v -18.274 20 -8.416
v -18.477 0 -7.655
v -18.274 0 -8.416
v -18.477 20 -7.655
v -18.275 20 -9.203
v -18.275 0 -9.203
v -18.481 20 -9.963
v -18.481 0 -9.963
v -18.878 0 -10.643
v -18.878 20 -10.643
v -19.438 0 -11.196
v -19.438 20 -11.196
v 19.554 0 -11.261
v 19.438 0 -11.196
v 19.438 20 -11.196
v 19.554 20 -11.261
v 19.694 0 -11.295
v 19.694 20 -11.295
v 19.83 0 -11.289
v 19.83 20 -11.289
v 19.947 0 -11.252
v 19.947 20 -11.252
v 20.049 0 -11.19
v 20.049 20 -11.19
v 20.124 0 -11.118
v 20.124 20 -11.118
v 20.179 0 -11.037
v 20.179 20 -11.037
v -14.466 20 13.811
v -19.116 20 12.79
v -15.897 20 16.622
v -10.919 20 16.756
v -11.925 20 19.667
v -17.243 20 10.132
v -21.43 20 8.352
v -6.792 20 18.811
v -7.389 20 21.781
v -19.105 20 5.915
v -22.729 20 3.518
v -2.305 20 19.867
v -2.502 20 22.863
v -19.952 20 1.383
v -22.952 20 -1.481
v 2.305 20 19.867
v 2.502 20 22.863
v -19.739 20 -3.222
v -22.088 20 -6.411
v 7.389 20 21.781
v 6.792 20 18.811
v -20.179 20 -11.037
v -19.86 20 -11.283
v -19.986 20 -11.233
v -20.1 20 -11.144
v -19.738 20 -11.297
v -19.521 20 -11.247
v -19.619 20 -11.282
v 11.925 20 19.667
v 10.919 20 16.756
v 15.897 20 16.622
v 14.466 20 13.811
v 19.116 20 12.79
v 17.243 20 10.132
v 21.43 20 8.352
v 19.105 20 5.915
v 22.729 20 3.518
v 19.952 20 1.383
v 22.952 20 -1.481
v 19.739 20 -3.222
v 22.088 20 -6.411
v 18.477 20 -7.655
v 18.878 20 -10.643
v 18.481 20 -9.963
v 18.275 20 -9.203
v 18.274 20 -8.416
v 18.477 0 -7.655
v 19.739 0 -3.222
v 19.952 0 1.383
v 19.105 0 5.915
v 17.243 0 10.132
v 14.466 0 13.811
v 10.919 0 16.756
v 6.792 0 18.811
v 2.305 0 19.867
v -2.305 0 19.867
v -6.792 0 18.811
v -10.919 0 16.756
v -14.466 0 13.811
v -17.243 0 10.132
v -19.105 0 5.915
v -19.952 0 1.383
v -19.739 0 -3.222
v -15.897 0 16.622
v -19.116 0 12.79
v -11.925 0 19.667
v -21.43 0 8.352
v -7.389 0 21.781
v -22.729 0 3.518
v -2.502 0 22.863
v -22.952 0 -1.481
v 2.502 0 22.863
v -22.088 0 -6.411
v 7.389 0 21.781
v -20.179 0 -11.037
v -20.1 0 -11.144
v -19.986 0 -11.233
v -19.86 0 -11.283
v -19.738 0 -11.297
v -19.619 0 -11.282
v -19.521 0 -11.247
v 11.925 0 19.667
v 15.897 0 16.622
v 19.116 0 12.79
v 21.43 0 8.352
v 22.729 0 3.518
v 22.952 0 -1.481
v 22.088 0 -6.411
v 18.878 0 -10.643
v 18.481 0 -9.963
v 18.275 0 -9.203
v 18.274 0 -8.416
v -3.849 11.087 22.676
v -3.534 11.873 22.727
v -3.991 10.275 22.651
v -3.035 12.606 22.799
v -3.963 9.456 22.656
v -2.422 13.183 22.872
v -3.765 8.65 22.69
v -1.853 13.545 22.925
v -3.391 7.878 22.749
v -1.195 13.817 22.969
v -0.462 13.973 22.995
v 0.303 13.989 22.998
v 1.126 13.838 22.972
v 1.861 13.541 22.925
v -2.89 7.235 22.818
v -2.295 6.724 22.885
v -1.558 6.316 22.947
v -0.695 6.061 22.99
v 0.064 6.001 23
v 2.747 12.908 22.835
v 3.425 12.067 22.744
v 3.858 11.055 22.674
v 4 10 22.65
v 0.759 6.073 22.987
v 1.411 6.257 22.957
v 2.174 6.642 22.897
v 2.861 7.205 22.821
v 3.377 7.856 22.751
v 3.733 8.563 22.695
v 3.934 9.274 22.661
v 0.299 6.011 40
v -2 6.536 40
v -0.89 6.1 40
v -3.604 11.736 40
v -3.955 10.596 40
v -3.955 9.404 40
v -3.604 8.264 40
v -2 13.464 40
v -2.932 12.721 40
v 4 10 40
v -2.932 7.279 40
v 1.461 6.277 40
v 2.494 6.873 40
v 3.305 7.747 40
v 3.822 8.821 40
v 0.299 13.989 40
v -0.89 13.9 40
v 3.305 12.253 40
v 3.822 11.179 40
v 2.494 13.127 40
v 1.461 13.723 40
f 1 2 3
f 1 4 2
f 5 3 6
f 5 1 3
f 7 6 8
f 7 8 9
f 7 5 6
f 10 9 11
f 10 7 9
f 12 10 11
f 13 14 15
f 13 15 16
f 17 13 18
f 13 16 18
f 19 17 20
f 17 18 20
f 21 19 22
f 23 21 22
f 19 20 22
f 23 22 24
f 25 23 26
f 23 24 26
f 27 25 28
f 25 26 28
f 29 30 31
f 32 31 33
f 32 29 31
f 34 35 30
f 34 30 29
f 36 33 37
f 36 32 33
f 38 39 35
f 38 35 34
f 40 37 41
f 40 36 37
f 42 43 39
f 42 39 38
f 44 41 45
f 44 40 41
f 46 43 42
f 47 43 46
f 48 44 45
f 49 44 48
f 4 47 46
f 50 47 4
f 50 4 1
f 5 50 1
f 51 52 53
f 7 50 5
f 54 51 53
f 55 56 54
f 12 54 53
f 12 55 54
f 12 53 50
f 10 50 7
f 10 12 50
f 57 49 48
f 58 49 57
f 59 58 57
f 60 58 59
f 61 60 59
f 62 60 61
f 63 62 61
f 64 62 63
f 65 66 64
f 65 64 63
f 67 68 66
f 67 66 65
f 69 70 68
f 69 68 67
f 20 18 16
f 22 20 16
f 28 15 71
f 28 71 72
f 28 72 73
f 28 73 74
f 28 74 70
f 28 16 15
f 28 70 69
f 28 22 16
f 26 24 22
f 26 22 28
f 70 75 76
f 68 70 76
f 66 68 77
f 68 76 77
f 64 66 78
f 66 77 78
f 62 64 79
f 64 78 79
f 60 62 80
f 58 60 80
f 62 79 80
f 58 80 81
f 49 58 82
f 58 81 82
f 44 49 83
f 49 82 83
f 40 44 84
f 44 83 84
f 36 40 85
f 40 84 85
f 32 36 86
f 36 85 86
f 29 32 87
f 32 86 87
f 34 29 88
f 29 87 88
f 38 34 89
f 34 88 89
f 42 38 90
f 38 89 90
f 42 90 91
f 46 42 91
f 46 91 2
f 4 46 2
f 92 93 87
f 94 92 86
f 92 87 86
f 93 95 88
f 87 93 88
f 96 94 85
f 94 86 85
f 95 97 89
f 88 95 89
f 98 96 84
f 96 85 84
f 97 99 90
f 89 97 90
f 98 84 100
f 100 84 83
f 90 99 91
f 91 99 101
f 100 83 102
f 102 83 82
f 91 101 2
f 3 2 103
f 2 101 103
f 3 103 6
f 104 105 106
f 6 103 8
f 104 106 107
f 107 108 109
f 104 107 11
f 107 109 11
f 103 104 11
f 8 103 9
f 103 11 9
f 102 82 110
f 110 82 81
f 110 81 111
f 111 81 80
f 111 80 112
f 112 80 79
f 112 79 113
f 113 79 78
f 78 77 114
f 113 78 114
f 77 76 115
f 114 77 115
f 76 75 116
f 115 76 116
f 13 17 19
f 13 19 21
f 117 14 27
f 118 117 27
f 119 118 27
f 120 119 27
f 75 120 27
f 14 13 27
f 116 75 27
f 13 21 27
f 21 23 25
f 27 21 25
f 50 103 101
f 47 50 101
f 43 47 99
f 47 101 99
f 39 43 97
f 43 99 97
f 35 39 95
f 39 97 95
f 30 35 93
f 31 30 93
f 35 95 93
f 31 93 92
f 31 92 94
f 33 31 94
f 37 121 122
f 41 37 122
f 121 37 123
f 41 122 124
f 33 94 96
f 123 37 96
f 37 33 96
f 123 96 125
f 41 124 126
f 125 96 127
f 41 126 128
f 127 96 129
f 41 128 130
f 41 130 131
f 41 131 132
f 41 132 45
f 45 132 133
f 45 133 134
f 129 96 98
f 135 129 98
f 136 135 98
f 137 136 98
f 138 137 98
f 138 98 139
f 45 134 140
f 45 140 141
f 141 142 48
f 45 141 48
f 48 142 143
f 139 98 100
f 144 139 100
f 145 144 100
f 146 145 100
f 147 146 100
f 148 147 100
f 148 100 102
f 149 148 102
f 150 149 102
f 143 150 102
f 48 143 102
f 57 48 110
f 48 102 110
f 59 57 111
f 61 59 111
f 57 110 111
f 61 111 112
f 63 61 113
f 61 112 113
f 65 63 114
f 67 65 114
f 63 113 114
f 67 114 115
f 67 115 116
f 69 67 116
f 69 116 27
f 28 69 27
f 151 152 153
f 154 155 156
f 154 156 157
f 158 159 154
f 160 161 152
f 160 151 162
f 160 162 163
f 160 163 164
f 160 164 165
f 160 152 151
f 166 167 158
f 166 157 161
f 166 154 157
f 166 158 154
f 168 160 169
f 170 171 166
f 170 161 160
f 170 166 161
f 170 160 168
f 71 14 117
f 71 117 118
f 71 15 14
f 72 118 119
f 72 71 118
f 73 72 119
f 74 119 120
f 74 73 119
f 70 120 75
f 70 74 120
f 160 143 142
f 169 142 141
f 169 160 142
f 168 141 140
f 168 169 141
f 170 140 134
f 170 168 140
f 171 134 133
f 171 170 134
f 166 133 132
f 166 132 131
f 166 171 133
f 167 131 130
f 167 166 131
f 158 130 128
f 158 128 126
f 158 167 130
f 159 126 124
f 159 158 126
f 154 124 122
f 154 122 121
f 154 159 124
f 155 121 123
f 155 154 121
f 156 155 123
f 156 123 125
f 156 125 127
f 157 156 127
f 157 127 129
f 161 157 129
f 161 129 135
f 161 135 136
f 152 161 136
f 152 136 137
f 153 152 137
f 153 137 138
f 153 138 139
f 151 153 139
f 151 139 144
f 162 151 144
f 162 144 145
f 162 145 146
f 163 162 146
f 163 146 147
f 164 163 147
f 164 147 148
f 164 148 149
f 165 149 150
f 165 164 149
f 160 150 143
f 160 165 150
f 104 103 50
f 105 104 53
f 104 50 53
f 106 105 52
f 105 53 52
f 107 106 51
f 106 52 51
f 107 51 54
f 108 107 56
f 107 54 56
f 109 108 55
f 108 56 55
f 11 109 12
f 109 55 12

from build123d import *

# Parameters (mm, degrees)
EXTRUIR1_DEPTH      = 20
EXTRUIR2_REACH      = 80.184
EXTRUIR2_END_RADIUS = 23
EXTRUIR2_START      = 40
CROQUIS2_R          = 4
REDONDEO1_R         = 3
REDONDEO2_R         = 0.5


with BuildPart() as part:
    # Croquis1 → Extruir1 (new body)
    with BuildSketch(Plane(origin=(0, 0, 0), x_dir=(1, 0, 0), z_dir=(0, 1, 0))):
        with BuildLine():
            Line((19.918584287, 11.5), (17.320508076, 10))
            ThreePointArc((17.320508076, 10), (0, -20), (-17.320508076, 10))
            Line((-17.320508076, 10), (-19.918584287, 11.5))
            ThreePointArc((-19.918584287, 11.5), (0, -23), (19.918584287, 11.5))
        make_face()
    extrude(amount=EXTRUIR1_DEPTH)

    # Extruir2: up to this cylinder (the profile starts outside it)
    extruir2_end = Plane(origin=(0, 10, 0), z_dir=(0, -1, 0)) * Cylinder(EXTRUIR2_END_RADIUS, 207.368, mode=Mode.PRIVATE)
    # Croquis2 → Extruir2 (add, up to the surface)
    with BuildSketch(Plane.XY.offset(EXTRUIR2_START), mode=Mode.PRIVATE) as extruir2_sk1:
        with Locations((0, 10)):
            Circle(CROQUIS2_R)
    extruir2_tool1 = extrude(extruir2_sk1.sketch, amount=-EXTRUIR2_REACH, mode=Mode.PRIVATE) - extruir2_end
    add(extruir2_tool1.solids().sort_by_distance((0, 10, 40))[0])

    # Redondeo1
    redondeo1_edges = [part.edges().sort_by_distance(p)[0] for p in [
        (17.320508076, 10, -10),
        (-17.320508076, 10, -10),
    ]]
    fillet(redondeo1_edges, radius=REDONDEO1_R)

    # Redondeo2
    redondeo2_edges = [part.edges().sort_by_distance(p)[0] for p in [
        (19.918584287, 10, -11.5),
        (-19.918584287, 10, -11.5),
    ]]
    fillet(redondeo2_edges, radius=REDONDEO2_R)


solid = part.part
